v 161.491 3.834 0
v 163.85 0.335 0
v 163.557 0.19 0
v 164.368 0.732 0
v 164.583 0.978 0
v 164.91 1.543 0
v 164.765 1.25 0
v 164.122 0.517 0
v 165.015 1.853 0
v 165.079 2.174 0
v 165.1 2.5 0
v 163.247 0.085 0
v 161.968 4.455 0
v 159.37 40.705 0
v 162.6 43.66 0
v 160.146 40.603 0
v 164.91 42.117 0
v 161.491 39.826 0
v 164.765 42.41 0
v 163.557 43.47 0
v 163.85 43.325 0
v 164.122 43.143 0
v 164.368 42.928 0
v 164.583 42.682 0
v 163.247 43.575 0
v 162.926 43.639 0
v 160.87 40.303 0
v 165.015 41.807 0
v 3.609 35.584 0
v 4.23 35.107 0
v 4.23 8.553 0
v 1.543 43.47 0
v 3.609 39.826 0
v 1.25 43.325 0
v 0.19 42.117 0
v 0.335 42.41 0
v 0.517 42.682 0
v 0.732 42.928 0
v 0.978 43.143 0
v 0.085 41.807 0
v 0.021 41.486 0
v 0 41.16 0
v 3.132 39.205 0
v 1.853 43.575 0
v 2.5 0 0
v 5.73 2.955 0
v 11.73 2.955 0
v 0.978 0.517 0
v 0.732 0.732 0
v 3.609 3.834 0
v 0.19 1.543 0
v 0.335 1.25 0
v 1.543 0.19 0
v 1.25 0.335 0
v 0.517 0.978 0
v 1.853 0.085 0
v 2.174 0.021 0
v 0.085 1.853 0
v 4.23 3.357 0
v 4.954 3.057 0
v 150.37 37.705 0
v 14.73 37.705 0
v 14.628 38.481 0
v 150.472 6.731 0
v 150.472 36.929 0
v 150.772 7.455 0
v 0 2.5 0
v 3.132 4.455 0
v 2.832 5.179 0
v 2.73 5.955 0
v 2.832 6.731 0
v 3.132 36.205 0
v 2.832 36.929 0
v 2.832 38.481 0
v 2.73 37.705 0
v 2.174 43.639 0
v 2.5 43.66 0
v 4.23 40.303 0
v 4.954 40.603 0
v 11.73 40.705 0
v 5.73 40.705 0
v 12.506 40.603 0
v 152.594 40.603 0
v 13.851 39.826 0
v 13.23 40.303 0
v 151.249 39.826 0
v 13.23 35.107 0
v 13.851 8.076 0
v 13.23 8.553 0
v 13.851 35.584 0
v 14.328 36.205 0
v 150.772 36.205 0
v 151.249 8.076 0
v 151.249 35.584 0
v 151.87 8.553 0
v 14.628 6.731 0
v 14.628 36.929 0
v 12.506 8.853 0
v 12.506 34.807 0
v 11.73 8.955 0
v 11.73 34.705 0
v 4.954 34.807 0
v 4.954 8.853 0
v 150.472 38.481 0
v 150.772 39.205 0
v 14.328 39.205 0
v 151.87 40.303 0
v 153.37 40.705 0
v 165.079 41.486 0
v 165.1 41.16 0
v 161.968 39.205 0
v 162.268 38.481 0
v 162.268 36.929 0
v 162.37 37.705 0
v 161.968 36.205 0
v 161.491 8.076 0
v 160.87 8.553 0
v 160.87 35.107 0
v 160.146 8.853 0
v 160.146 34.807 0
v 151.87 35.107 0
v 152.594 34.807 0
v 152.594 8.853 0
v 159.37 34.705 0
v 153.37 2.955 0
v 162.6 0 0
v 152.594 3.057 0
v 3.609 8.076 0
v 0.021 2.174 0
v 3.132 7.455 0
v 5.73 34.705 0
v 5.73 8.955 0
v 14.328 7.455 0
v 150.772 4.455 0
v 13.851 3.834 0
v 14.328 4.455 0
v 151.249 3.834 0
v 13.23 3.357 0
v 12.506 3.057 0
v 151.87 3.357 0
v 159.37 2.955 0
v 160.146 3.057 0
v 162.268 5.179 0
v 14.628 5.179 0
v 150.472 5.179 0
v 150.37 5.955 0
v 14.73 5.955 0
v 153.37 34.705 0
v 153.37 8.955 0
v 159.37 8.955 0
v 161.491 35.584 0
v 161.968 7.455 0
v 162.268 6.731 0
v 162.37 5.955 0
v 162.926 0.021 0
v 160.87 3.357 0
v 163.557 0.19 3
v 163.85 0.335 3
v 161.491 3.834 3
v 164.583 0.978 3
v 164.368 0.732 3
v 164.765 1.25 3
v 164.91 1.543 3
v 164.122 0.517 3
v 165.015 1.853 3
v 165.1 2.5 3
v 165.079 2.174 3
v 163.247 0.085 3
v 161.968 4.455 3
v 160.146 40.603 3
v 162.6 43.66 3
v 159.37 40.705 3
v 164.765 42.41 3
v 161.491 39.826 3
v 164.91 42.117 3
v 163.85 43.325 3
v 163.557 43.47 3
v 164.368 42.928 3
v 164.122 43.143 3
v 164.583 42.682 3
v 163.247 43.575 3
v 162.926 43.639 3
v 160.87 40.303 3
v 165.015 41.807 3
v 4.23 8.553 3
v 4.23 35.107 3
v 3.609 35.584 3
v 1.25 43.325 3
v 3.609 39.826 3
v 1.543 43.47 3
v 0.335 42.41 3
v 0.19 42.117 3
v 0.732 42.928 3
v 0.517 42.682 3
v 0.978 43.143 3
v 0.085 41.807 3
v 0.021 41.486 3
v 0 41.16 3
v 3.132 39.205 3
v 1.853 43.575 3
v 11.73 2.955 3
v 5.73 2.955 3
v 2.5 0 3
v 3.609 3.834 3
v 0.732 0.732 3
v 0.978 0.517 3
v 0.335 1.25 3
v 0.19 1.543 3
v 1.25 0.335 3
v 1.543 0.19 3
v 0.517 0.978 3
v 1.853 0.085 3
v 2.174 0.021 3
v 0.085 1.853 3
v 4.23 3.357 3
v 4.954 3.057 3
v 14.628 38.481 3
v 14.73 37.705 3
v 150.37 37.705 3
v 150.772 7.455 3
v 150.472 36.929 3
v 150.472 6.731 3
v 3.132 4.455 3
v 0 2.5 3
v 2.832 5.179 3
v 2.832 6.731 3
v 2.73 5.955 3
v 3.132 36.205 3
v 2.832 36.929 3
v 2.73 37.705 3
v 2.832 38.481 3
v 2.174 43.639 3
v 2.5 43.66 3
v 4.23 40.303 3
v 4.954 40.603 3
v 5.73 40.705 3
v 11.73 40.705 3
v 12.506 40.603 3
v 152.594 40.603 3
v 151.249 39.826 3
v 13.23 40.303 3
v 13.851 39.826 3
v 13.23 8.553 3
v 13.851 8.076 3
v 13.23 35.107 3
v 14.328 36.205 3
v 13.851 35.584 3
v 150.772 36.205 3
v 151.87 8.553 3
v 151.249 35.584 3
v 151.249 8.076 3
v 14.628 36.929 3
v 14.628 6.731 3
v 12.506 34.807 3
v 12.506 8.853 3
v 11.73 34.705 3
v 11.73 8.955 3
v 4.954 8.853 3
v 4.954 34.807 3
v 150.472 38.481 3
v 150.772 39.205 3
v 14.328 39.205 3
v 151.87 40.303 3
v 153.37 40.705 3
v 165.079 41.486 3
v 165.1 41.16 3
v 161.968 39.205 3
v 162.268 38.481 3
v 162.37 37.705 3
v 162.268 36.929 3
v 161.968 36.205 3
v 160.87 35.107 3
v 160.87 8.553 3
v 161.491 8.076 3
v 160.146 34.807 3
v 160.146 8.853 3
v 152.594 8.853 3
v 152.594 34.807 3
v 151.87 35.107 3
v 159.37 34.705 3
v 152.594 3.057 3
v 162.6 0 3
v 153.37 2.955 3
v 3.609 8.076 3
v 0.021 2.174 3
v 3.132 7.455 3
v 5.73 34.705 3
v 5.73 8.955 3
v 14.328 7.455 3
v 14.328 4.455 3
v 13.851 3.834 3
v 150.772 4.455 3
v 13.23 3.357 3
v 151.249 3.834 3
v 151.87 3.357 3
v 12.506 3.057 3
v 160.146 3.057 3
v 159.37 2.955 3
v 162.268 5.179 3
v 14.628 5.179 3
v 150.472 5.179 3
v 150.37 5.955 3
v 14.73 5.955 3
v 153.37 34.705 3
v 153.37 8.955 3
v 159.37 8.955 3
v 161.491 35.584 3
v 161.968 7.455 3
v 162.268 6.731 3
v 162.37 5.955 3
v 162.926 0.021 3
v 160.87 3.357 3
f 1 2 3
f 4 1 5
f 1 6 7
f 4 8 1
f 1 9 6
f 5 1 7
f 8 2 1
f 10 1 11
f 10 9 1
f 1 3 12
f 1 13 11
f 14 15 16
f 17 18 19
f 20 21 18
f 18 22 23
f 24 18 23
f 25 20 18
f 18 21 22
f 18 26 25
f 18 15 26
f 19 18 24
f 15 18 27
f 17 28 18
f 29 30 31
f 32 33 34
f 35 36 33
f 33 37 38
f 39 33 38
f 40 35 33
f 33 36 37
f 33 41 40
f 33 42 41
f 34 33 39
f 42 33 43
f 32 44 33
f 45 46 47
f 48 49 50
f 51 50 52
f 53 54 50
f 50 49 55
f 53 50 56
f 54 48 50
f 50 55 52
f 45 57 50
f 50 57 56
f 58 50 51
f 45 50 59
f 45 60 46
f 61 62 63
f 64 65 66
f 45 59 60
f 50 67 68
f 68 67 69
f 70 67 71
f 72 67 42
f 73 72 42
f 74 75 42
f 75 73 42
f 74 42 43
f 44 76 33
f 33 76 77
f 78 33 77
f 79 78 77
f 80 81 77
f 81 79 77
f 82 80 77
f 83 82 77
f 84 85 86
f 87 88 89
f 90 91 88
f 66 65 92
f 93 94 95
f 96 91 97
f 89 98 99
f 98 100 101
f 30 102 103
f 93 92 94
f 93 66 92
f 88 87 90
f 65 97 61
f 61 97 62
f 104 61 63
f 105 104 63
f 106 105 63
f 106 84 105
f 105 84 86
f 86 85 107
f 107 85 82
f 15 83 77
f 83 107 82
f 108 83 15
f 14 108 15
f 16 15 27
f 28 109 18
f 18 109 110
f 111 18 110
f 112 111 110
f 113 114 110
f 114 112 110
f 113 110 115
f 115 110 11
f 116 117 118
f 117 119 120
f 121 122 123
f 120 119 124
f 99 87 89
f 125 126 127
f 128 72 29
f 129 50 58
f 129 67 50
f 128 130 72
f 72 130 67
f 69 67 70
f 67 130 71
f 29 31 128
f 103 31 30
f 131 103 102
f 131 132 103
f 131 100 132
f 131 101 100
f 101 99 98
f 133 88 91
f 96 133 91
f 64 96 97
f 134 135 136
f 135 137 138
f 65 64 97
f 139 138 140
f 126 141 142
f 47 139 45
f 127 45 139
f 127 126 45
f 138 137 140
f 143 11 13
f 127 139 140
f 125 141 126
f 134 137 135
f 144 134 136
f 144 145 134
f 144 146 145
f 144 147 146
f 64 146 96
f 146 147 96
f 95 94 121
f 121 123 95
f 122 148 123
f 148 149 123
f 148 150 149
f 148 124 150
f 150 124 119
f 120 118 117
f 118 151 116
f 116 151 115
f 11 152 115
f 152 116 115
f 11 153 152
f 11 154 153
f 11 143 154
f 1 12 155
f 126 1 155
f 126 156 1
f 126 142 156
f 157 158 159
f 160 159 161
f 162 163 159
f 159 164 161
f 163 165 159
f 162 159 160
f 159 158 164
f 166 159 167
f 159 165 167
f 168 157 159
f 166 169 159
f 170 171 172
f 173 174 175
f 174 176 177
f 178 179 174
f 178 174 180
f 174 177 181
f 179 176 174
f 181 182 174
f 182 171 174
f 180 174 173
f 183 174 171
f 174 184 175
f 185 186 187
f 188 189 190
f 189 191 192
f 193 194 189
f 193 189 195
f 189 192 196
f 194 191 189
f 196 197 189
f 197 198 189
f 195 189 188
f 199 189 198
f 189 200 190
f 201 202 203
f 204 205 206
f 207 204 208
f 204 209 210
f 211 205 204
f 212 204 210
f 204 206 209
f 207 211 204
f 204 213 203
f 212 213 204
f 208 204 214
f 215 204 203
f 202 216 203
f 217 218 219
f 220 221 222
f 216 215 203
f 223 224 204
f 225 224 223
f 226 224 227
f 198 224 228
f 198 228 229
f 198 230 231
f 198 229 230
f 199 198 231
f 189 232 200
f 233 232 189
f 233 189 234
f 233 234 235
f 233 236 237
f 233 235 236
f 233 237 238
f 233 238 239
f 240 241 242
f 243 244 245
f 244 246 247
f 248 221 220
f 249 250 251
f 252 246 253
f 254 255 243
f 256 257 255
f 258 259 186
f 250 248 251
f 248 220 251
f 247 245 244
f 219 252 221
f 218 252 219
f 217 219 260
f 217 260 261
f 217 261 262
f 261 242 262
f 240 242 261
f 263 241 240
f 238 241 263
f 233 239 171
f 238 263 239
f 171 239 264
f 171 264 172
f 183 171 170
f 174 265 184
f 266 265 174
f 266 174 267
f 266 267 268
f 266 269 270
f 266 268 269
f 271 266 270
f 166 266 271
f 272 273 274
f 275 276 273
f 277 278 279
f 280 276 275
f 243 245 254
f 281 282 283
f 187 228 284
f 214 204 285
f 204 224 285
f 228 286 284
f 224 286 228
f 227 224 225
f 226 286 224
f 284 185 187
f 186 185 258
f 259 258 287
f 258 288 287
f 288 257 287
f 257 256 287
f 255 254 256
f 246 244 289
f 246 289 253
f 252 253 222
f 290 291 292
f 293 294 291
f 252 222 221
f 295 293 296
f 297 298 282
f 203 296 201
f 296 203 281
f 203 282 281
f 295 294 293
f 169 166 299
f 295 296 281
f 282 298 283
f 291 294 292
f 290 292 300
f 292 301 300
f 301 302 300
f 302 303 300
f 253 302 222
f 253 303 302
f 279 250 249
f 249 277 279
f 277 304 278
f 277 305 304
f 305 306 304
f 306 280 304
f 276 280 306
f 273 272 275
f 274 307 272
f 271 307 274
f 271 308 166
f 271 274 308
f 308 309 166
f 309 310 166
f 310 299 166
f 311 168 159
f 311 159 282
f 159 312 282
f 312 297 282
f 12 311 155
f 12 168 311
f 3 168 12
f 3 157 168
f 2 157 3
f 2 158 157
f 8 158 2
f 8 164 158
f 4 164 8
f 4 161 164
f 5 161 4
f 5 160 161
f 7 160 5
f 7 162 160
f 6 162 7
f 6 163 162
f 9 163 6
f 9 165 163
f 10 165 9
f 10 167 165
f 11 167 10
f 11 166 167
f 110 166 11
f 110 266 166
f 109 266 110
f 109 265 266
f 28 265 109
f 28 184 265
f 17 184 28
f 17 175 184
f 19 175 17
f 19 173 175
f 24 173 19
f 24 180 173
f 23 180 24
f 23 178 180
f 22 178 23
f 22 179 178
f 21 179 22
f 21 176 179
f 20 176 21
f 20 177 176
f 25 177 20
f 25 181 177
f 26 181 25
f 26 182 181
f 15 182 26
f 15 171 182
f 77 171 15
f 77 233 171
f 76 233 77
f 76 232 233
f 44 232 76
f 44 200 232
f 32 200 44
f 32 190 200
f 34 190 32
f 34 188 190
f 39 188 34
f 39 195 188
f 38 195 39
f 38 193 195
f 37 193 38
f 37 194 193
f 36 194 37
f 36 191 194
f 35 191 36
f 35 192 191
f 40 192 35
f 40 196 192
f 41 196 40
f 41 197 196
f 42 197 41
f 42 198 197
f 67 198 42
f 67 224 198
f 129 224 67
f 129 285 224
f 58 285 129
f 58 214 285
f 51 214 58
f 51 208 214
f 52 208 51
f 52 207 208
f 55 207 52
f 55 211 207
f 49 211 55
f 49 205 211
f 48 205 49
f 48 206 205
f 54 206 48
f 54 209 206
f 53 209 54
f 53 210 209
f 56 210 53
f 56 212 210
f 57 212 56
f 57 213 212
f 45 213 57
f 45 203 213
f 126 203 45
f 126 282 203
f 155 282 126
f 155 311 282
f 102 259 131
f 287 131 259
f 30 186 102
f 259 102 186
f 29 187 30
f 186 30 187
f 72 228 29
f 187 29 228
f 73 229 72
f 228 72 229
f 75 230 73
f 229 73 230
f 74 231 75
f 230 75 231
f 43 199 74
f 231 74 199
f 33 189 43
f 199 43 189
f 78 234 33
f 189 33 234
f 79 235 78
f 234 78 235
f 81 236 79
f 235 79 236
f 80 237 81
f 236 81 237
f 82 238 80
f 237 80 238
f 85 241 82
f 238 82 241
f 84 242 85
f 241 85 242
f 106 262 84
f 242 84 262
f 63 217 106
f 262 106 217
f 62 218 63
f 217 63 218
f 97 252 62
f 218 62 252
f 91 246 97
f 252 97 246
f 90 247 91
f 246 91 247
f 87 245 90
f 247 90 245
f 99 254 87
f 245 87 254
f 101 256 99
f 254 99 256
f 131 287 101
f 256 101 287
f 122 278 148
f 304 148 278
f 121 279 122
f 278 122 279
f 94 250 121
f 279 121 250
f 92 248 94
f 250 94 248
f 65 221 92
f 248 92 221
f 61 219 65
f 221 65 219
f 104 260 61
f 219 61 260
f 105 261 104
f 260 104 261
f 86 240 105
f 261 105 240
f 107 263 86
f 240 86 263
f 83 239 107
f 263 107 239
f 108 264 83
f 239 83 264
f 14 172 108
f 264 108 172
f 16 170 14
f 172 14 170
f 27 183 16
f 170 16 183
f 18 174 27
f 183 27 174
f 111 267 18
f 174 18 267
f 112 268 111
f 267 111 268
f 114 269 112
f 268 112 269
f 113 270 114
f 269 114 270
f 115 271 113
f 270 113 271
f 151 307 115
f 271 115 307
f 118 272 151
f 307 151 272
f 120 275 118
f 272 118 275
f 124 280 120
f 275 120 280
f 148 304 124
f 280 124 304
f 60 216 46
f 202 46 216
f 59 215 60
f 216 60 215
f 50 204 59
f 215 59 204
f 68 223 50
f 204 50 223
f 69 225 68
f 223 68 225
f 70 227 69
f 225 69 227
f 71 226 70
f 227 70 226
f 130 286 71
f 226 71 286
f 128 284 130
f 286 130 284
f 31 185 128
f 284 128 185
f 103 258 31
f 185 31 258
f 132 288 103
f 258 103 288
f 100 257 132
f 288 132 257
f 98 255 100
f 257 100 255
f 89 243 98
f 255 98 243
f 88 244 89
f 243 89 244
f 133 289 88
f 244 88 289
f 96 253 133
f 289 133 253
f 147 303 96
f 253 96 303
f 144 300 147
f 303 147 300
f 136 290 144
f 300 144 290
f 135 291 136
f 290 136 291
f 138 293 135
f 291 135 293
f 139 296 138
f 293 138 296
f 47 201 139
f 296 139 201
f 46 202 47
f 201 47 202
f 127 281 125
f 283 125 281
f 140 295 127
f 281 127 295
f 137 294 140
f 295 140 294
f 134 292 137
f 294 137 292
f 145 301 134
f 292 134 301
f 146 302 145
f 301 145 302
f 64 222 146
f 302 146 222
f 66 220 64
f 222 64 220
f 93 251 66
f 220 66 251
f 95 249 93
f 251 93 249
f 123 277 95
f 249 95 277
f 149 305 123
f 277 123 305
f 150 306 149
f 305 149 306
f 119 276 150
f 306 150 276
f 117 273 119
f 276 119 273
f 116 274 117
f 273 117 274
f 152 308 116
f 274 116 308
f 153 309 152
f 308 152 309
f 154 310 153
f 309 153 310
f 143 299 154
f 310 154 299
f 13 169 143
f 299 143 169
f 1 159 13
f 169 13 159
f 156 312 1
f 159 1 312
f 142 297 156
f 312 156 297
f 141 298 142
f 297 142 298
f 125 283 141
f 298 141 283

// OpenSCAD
/**
 * OpenSCAD Rack Plate Library
 * 
 * Conforms to standards defined in Wikipedia for Rack Units (19-inch racks).
 * Formula for height: h = 44.45 * n - 0.79 (mm)
 * Standard mounting width: 465.14 mm (center-to-center)
 */

// --- Default Values ---
DEFAULT_U_COUNT = 1;
DEFAULT_THICKNESS = 3;
DEFAULT_WIDTH_INCHES = 6.5;
DEFAULT_CORNER_RADIUS = 2.5;
DEFAULT_HOLE_DIAMETER = 6;
DEFAULT_SLOT_LENGTH = 12; // At least twice the diameter (6mm * 2)

// --- Modules ---

/**
 * Generates a rack plate.
 * 
 * @param u_count Number of rack units (n)
 * @param thickness Plate thickness in mm
 * @param width_inches Nominal width of the rack in inches (default 19)
 * @param corner_radius Radius for the outer corners in mm
 * @param hole_diameter Diameter of the mounting holes in mm
 * @param slot_length Total length of the oblong mounting holes in mm
 */
module rack_plate(
    u_count = DEFAULT_U_COUNT,
    thickness = DEFAULT_THICKNESS,
    width_inches = DEFAULT_WIDTH_INCHES,
    corner_radius = DEFAULT_CORNER_RADIUS,
    hole_diameter = DEFAULT_HOLE_DIAMETER,
    slot_length = DEFAULT_SLOT_LENGTH
) {
    // Requirements validation
    assert(width_inches >= 5.5 && width_inches <= 23, "Width must be between 5.5 and 23 inches");

    // Constants based on requirements
    u_height_mm = 44.45;
    height_offset_mm = 0.79;
    
    // Formula: h = 44.45 * n - 0.79
    total_height = (u_height_mm * u_count) - height_offset_mm;
    
    // 19-inch rack mounting width (center to center)
    // Wikipedia: 18.313 in = 465.14 mm
    standard_mounting_width = 465.14; 
    standard_total_width = 19 * 25.4; // 482.6 mm
    
    // Total width of the plate. 
    total_width = width_inches * 25.4;
    

    // Flange width calculation (distance from edge to mounting hole center)
    // "It is critical that the mounting holes retain their position relative to the adjacent ends of the panel"
    // For a standard 19" rack, the offset from edge to hole center is:
    edge_to_hole_offset = (standard_total_width - standard_mounting_width) / 2;

    linear_extrude(height = thickness) {
        difference() {
            // Main Plate Body with rounded corners
            rounded_rect(total_width, total_height, corner_radius);

            // Mounting Holes
            // "The code should generate flanges with 2 rather than three holes per 1 U of height."
            if (u_count >= 1) {
                for (u = [0 : floor(u_count) - 1]) {
                    u_base_y = u * u_height_mm;
                    hole_spacing = 31.75; 
                    y_offset = (u_height_mm - hole_spacing) / 2;
                    
                    y_pos1 = u_base_y + y_offset;
                    y_pos2 = u_base_y + y_offset + hole_spacing;
    
                    // Center holes in the total_height
                    // Since total_height = u_count * 44.45 - 0.79, 
                    // the gaps are at the top and bottom of the stack.
                    // We shift everything by (0.79 / 2) to center it if we consider 
                    // the 0.79 to be distributed.
                    // Actually, the previous code had a formula for center_shift.
                    total_nominal_height = u_height_mm * u_count;
                    center_shift = (total_nominal_height - total_height) / 2;
                    
                    p1 = y_pos1 - center_shift;
                    p2 = y_pos2 - center_shift;
    
                    // Left Holes (Oblong)
                    translate([edge_to_hole_offset, p1]) 
                        oblong_hole(hole_diameter, slot_length);
                    translate([edge_to_hole_offset, p2]) 
                        oblong_hole(hole_diameter, slot_length);
                        
                    // Right Holes (Oblong)
                    translate([total_width - edge_to_hole_offset, p1]) 
                        oblong_hole(hole_diameter, slot_length);
                    translate([total_width - edge_to_hole_offset, p2]) 
                        oblong_hole(hole_diameter, slot_length);
                }
            }
        }
    }
}

/**
 * Helper for oblong (slotted) hole
 */
module oblong_hole(d, l) {
    hull() {
        translate([-(l - d) / 2, 0]) circle(d = d, $fn = 24);
        translate([(l - d) / 2, 0]) circle(d = d, $fn = 24);
    }
}

/**
 * Helper for rounded rectangle 2D shape
 */
module rounded_rect(w, h, r) {
    translate([r, r, 0])
    minkowski() {
        square([w - 2 * r, h - 2 * r]);
        circle(r = r, $fn = 48);
    }
}

// --- Example Usage ---
// This will render when the file is opened directly in OpenSCAD
// but won't interfere when included in other files.

rack_plate(u_count = 1, width_inches= 6.5);
